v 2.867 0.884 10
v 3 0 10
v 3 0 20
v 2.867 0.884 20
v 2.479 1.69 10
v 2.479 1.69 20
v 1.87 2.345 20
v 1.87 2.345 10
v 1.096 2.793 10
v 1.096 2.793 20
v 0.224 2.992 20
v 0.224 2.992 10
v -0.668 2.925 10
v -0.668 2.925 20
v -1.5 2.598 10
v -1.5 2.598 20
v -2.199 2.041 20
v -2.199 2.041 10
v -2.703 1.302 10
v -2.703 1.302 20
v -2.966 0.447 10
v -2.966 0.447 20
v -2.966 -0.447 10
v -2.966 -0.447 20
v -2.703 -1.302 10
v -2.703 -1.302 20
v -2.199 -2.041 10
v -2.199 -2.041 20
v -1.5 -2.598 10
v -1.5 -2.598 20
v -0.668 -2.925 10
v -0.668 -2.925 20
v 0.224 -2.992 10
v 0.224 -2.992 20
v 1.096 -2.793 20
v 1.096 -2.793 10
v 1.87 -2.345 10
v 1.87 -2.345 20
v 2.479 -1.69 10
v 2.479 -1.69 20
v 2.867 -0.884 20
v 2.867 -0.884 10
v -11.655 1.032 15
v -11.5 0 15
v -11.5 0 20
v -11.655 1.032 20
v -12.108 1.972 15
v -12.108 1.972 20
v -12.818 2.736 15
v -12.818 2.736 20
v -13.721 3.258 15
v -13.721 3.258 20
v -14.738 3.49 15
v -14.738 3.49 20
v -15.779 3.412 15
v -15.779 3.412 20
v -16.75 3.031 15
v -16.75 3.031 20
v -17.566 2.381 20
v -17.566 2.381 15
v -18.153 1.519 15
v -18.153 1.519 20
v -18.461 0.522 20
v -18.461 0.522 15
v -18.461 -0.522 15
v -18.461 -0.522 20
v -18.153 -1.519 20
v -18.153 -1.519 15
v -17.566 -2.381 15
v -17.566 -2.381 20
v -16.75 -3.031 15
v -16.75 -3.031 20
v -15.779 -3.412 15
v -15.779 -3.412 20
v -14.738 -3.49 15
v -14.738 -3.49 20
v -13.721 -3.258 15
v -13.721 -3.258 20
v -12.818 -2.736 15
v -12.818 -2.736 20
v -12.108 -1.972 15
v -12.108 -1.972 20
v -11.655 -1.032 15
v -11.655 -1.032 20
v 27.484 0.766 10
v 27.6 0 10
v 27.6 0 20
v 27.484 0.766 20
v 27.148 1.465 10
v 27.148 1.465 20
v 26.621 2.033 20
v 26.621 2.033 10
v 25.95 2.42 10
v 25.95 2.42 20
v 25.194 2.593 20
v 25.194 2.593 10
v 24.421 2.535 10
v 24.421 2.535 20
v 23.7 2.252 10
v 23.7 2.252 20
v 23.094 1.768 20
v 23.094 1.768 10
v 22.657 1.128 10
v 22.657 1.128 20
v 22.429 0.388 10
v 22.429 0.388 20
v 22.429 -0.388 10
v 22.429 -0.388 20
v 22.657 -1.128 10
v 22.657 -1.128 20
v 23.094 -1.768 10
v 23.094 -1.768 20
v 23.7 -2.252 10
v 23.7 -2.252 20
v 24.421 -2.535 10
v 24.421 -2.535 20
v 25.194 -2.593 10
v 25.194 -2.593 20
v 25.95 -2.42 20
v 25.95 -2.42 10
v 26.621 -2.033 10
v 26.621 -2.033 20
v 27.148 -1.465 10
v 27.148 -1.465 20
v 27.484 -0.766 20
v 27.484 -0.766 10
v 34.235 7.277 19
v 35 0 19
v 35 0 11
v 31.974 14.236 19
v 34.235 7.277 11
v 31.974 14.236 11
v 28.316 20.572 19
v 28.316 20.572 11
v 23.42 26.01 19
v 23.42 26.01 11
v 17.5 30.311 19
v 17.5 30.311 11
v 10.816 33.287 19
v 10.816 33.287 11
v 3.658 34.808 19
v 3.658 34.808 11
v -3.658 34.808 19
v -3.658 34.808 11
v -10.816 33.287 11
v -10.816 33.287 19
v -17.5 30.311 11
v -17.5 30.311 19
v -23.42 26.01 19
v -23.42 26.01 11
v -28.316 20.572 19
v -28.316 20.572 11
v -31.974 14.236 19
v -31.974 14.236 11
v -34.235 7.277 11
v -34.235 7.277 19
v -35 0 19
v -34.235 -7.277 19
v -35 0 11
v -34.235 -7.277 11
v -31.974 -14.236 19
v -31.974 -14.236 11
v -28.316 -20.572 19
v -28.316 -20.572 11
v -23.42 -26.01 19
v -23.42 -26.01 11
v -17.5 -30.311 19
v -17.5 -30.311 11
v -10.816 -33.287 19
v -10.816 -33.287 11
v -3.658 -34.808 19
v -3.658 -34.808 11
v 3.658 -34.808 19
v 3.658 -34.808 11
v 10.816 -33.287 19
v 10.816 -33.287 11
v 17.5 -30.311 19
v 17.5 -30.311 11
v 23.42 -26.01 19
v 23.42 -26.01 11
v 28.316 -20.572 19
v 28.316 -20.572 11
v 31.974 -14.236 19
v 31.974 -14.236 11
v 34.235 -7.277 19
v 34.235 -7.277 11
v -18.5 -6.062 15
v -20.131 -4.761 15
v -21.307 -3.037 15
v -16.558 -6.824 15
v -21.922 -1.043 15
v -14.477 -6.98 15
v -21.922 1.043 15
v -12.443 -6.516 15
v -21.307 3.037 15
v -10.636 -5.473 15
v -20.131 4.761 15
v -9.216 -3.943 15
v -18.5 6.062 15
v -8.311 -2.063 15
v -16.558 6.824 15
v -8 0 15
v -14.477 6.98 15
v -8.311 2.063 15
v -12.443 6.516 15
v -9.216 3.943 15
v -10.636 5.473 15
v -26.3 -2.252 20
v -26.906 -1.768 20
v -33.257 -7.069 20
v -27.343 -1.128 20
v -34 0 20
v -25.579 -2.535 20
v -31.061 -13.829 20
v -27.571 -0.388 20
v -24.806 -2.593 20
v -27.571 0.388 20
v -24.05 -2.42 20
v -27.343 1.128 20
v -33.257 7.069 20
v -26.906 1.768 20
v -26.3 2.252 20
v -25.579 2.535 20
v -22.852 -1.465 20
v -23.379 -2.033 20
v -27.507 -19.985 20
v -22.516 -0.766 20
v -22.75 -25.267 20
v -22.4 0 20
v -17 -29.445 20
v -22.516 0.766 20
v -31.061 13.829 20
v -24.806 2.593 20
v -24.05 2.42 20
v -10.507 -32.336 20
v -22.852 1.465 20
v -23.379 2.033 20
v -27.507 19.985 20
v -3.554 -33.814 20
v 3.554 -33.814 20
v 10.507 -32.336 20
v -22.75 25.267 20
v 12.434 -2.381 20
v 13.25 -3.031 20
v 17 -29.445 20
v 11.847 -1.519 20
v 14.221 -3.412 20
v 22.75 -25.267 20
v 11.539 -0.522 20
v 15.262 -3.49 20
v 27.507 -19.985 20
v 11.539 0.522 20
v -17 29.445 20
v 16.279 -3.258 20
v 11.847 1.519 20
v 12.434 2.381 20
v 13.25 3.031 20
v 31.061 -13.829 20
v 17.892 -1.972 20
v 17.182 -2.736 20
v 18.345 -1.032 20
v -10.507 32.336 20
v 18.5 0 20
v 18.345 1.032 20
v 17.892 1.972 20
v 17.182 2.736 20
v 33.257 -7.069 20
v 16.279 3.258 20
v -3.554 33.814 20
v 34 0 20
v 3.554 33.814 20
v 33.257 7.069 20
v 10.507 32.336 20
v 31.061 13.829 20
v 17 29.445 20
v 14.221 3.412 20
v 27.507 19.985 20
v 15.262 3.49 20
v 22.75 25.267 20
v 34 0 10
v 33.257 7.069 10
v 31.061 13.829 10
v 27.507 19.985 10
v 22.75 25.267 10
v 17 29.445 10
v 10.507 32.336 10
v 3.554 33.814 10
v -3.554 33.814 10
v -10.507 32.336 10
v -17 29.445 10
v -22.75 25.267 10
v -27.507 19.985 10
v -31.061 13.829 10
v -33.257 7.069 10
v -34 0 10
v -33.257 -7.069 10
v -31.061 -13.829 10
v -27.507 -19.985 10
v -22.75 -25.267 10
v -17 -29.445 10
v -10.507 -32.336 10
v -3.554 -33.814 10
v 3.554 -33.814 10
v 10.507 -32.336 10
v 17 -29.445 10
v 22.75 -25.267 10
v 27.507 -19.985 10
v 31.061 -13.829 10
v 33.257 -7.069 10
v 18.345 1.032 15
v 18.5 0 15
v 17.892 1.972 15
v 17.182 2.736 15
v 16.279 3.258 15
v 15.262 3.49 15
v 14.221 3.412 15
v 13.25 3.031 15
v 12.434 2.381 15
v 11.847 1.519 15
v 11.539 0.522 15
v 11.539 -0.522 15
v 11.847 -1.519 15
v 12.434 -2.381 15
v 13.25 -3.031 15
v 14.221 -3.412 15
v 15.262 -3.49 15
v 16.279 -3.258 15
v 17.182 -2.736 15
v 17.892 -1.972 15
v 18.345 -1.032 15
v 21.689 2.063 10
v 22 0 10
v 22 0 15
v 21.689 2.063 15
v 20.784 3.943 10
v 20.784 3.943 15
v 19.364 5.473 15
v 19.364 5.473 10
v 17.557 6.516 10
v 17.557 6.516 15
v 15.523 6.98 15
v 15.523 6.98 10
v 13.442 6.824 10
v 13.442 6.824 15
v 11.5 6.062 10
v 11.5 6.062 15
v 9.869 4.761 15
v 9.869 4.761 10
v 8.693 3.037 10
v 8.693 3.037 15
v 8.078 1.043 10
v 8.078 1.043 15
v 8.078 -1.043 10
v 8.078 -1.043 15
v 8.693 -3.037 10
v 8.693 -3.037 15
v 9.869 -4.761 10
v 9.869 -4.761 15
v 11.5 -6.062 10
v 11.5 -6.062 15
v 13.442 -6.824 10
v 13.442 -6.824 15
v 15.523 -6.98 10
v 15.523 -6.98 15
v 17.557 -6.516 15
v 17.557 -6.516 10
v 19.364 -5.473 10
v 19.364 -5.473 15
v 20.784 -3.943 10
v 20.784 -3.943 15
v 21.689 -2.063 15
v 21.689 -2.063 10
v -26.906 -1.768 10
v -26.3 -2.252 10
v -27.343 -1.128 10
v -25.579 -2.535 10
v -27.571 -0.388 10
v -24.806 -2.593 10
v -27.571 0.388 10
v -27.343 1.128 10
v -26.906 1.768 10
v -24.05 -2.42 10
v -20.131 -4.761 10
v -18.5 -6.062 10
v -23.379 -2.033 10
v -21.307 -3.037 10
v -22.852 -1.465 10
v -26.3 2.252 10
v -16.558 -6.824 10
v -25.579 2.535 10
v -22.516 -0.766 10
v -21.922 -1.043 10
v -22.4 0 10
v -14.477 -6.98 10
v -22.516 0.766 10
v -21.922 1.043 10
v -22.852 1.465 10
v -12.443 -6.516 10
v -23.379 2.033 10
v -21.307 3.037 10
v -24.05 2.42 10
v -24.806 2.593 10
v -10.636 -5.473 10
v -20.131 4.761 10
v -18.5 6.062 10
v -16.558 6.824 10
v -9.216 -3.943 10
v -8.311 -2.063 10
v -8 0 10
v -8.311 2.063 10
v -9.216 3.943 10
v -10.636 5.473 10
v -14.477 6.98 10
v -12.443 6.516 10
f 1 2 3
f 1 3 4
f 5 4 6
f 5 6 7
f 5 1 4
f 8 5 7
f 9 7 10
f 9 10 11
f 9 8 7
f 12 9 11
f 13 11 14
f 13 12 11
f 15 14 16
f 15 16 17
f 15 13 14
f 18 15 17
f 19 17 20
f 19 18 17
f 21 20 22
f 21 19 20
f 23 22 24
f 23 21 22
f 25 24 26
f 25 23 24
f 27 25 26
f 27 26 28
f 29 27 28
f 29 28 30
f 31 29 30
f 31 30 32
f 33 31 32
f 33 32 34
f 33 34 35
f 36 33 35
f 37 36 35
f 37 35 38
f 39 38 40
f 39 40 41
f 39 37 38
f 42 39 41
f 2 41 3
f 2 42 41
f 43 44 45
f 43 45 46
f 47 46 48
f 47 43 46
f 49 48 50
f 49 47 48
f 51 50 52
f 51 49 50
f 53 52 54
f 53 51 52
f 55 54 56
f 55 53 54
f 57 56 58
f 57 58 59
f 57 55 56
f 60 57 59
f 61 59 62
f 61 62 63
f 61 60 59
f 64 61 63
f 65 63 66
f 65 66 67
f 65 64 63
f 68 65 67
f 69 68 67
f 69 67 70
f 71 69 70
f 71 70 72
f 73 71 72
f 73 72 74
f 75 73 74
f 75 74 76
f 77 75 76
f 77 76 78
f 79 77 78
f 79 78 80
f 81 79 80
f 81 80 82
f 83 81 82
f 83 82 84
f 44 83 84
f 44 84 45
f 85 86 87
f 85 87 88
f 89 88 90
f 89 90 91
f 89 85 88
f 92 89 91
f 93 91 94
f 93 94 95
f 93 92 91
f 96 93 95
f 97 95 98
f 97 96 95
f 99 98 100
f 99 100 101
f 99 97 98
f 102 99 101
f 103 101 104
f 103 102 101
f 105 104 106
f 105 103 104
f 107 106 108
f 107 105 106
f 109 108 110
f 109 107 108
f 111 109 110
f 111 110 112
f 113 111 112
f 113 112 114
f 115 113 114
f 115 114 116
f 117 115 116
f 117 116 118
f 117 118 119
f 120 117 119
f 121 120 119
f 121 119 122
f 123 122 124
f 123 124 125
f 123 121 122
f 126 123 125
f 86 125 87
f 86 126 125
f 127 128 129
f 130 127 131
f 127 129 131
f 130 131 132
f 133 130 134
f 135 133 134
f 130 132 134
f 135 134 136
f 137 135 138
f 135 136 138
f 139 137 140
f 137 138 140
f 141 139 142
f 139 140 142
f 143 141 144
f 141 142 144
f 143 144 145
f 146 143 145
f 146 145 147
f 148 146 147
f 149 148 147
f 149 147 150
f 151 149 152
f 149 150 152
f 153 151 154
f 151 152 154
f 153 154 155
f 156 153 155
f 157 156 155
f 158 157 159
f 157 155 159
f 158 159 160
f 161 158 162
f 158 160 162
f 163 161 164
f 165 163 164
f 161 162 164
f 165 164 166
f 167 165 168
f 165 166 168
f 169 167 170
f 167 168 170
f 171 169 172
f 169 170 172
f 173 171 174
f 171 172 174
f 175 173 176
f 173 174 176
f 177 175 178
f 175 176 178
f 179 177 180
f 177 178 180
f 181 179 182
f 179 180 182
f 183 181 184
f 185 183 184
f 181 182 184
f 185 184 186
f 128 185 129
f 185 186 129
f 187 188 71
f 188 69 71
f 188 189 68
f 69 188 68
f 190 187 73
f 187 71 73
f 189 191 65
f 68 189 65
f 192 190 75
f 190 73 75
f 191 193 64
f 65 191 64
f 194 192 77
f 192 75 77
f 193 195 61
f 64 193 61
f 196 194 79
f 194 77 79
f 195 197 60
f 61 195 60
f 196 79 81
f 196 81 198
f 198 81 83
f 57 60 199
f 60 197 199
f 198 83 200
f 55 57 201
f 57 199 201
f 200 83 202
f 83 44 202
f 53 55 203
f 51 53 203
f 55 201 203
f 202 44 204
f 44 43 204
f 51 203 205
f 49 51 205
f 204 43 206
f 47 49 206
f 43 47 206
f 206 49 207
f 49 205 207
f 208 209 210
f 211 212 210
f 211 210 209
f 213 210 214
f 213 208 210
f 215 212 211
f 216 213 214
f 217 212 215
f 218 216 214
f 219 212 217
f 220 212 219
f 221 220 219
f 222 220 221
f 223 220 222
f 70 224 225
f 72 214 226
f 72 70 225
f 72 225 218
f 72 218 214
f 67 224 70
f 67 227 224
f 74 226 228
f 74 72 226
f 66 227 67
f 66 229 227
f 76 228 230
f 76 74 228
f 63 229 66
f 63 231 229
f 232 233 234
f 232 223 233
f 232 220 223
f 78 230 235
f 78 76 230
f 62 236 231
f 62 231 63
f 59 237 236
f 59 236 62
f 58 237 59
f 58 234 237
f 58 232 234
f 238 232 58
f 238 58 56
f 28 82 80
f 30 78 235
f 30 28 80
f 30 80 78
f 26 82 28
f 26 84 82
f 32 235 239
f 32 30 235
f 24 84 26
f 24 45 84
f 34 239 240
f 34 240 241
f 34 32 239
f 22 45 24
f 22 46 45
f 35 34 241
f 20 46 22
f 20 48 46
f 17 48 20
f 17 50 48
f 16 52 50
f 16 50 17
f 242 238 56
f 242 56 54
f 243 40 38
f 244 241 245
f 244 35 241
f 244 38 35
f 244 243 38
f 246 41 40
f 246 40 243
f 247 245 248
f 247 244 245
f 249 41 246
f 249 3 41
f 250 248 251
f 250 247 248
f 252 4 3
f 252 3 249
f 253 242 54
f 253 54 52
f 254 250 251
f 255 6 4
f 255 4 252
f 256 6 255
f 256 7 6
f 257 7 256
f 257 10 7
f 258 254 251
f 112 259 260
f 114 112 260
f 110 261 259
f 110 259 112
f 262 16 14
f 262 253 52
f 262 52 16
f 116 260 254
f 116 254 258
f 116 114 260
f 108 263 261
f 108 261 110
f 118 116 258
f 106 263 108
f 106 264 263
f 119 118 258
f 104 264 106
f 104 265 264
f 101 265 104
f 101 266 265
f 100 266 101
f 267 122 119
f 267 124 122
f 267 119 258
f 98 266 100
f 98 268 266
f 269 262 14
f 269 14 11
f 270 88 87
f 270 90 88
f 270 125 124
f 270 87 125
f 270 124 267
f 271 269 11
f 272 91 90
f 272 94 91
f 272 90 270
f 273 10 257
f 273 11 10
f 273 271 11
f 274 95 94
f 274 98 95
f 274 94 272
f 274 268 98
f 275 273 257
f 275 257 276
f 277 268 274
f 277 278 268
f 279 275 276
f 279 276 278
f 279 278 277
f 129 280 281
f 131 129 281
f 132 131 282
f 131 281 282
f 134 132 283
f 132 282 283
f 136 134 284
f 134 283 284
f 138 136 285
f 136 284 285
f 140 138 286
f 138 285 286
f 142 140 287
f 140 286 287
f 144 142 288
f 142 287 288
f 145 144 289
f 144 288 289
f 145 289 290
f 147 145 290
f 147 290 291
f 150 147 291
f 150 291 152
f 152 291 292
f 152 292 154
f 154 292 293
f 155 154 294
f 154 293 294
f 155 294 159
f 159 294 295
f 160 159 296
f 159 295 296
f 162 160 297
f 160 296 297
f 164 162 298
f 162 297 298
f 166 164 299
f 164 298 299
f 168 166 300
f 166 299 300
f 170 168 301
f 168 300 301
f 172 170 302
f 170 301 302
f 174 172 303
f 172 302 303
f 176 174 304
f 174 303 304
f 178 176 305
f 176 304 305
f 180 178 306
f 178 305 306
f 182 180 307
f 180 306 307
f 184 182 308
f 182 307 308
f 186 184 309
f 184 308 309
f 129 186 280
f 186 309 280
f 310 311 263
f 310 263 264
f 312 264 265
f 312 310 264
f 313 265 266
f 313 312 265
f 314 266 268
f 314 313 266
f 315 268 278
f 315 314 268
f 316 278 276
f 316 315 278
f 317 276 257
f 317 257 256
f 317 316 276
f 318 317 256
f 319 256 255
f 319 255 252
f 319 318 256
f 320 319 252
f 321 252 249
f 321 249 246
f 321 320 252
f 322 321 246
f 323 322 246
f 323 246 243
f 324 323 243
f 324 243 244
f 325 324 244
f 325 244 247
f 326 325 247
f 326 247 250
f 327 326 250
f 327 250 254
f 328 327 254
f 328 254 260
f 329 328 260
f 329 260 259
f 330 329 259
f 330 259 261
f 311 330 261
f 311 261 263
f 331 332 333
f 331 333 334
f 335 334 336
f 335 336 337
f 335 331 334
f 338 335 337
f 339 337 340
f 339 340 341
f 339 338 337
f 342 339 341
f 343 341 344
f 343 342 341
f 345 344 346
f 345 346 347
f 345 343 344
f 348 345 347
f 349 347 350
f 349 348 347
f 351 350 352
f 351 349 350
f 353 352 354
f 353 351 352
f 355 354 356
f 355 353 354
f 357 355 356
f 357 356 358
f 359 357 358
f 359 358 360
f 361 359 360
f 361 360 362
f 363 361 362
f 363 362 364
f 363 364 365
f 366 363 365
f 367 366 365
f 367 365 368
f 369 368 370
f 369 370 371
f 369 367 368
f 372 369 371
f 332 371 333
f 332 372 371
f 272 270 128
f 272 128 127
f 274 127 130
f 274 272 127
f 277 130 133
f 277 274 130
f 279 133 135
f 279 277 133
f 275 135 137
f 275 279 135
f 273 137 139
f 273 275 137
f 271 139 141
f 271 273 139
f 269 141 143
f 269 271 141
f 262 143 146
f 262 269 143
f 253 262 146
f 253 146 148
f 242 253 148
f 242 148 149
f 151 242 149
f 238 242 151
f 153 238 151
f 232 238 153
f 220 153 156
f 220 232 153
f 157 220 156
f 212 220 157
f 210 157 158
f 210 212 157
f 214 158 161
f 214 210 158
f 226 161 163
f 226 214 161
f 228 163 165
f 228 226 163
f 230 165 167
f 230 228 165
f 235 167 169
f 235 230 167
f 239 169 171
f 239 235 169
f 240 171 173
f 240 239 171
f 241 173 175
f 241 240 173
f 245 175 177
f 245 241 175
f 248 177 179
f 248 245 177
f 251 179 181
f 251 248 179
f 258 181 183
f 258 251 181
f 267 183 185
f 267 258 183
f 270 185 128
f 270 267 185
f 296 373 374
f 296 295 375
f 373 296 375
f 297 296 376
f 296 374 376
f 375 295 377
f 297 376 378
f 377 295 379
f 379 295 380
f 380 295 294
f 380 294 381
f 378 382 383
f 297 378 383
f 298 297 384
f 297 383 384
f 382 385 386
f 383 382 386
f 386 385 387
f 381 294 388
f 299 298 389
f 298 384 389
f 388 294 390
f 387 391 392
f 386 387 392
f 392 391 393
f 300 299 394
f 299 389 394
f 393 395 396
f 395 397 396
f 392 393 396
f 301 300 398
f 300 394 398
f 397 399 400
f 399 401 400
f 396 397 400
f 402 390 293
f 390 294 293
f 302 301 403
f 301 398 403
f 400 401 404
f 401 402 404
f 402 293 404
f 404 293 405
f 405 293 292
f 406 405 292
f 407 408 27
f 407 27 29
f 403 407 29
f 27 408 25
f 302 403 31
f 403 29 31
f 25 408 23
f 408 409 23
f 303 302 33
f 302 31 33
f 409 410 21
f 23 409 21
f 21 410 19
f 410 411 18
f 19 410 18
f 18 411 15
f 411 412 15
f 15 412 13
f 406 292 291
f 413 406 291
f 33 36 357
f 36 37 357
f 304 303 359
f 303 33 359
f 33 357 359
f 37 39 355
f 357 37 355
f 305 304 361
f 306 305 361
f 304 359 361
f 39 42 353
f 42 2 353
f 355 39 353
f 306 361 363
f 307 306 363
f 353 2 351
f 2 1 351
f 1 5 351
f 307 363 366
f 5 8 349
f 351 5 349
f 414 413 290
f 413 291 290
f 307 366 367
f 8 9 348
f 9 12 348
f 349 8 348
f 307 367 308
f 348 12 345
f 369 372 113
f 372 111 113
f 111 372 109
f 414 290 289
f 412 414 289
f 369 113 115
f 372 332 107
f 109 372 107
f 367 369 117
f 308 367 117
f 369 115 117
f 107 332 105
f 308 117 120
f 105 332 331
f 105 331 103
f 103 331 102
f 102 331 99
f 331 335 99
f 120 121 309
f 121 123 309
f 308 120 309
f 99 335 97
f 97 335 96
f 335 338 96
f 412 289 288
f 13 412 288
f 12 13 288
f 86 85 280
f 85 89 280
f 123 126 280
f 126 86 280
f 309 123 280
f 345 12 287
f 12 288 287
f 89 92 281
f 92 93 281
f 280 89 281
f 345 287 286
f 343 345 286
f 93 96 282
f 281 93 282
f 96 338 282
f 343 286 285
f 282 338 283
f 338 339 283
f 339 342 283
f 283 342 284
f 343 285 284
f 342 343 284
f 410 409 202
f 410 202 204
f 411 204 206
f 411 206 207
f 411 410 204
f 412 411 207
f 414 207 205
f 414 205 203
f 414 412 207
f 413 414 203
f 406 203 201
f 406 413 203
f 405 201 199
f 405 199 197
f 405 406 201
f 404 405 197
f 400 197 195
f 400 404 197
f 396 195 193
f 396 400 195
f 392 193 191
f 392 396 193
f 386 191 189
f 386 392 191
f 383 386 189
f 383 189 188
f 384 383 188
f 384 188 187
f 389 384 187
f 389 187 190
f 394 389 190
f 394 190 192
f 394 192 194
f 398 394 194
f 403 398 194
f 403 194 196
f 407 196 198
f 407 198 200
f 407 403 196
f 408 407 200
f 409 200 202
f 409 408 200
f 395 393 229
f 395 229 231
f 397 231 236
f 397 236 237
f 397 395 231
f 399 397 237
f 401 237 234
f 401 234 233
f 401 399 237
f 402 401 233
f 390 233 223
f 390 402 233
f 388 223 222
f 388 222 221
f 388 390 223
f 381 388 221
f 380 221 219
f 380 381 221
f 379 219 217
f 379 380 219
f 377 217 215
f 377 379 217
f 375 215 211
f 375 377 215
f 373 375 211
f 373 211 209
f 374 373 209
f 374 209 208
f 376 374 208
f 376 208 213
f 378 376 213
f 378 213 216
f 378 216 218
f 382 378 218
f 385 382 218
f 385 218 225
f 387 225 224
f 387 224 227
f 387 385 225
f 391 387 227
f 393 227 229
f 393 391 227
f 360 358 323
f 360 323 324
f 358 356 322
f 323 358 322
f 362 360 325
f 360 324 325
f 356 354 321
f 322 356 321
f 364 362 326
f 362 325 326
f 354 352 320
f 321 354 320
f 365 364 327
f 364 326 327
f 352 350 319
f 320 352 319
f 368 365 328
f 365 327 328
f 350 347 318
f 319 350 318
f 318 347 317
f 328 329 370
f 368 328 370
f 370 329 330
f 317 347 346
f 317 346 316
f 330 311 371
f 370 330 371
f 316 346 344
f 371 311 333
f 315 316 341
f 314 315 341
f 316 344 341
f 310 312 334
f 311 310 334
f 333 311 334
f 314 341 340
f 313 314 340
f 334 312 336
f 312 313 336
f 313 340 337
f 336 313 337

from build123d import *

# Parameters (mm, degrees)
CYLINDER001_R        = 3.5
CYLINDER001_DEPTH    = 10
CYLINDER002_R        = 7
CYLINDER002_DEPTH    = 5
CYLINDER003_R        = 3.5
CYLINDER003_DEPTH    = 10
CYLINDER004_R        = 7
CYLINDER004_DEPTH    = 5
CYLINDER005_R        = 2.6
CYLINDER005_DEPTH    = 10
CYLINDER006_R        = 2.6
CYLINDER006_DEPTH    = 10
CYLINDER_R           = 3
CYLINDER_DEPTH       = 10
CYLINDER001027_R     = 35
CYLINDER001027_DEPTH = 10
CHAMFER004_SIZE      = 1


with BuildPart() as cylinder001:
    # cylinder001 → cylinder001 (new body)
    with BuildSketch(Plane(origin=(15, 0, 0), x_dir=(1, 0, 0), z_dir=(0, 0, 1))):
        Circle(CYLINDER001_R)
    extrude(amount=CYLINDER001_DEPTH)


with BuildPart() as cylinder002:
    # cylinder002 → cylinder002 (new body)
    with BuildSketch(Plane(origin=(15, 0, 0), x_dir=(1, 0, 0), z_dir=(0, 0, 1))):
        Circle(CYLINDER002_R)
    extrude(amount=CYLINDER002_DEPTH)


with BuildPart() as cylinder003:
    # cylinder003 → cylinder003 (new body)
    with BuildSketch(Plane(origin=(-15, 0, 0), x_dir=(1, 0, 0), z_dir=(0, 0, 1))):
        Circle(CYLINDER003_R)
    extrude(amount=CYLINDER003_DEPTH)


with BuildPart() as cylinder004:
    # cylinder004 → cylinder004 (new body)
    with BuildSketch(Plane(origin=(-15, 0, 0), x_dir=(1, 0, 0), z_dir=(0, 0, 1))):
        Circle(CYLINDER004_R)
    extrude(amount=CYLINDER004_DEPTH)


with BuildPart() as cylinder005:
    # cylinder005 → cylinder005 (new body)
    with BuildSketch(Plane(origin=(-25, 0, 0), x_dir=(1, 0, 0), z_dir=(0, 0, 1))):
        Circle(CYLINDER005_R)
    extrude(amount=CYLINDER005_DEPTH)


with BuildPart() as cylinder006:
    # cylinder006 → cylinder006 (new body)
    with BuildSketch(Plane(origin=(25, 0, 0), x_dir=(1, 0, 0), z_dir=(0, 0, 1))):
        Circle(CYLINDER006_R)
    extrude(amount=CYLINDER006_DEPTH)


with BuildPart() as union:
    # cylinder → cylinder (new body)
    with BuildSketch(Plane.XY):
        Circle(CYLINDER_R)
    extrude(amount=CYLINDER_DEPTH)

    # union: union cylinder001, cylinder002, cylinder003, cylinder004, cylinder005, cylinder006
    add(cylinder001.part)
    add(cylinder002.part)
    add(cylinder003.part)
    add(cylinder004.part)
    add(cylinder005.part)
    add(cylinder006.part)


with BuildPart() as hh1:
    # Cylinder001027 → Cylinder001027 (new body)
    with BuildSketch(Plane.XY):
        Circle(CYLINDER001027_R)
    extrude(amount=CYLINDER001027_DEPTH)

    # Cut004: cut union
    add(union.part, mode=Mode.SUBTRACT)


with BuildPart() as hh1_1:
    # Cut004 placement: moved
    add(hh1.part.moved(Location((0, 0, 10))))

    # Chamfer004
    chamfer004_edges = [hh1_1.edges().sort_by_distance(p)[0] for p in [
        (-35, 0, 20),
        (-35, 0, 10),
    ]]
    chamfer(chamfer004_edges, length=CHAMFER004_SIZE)


solid = hh1_1.part
